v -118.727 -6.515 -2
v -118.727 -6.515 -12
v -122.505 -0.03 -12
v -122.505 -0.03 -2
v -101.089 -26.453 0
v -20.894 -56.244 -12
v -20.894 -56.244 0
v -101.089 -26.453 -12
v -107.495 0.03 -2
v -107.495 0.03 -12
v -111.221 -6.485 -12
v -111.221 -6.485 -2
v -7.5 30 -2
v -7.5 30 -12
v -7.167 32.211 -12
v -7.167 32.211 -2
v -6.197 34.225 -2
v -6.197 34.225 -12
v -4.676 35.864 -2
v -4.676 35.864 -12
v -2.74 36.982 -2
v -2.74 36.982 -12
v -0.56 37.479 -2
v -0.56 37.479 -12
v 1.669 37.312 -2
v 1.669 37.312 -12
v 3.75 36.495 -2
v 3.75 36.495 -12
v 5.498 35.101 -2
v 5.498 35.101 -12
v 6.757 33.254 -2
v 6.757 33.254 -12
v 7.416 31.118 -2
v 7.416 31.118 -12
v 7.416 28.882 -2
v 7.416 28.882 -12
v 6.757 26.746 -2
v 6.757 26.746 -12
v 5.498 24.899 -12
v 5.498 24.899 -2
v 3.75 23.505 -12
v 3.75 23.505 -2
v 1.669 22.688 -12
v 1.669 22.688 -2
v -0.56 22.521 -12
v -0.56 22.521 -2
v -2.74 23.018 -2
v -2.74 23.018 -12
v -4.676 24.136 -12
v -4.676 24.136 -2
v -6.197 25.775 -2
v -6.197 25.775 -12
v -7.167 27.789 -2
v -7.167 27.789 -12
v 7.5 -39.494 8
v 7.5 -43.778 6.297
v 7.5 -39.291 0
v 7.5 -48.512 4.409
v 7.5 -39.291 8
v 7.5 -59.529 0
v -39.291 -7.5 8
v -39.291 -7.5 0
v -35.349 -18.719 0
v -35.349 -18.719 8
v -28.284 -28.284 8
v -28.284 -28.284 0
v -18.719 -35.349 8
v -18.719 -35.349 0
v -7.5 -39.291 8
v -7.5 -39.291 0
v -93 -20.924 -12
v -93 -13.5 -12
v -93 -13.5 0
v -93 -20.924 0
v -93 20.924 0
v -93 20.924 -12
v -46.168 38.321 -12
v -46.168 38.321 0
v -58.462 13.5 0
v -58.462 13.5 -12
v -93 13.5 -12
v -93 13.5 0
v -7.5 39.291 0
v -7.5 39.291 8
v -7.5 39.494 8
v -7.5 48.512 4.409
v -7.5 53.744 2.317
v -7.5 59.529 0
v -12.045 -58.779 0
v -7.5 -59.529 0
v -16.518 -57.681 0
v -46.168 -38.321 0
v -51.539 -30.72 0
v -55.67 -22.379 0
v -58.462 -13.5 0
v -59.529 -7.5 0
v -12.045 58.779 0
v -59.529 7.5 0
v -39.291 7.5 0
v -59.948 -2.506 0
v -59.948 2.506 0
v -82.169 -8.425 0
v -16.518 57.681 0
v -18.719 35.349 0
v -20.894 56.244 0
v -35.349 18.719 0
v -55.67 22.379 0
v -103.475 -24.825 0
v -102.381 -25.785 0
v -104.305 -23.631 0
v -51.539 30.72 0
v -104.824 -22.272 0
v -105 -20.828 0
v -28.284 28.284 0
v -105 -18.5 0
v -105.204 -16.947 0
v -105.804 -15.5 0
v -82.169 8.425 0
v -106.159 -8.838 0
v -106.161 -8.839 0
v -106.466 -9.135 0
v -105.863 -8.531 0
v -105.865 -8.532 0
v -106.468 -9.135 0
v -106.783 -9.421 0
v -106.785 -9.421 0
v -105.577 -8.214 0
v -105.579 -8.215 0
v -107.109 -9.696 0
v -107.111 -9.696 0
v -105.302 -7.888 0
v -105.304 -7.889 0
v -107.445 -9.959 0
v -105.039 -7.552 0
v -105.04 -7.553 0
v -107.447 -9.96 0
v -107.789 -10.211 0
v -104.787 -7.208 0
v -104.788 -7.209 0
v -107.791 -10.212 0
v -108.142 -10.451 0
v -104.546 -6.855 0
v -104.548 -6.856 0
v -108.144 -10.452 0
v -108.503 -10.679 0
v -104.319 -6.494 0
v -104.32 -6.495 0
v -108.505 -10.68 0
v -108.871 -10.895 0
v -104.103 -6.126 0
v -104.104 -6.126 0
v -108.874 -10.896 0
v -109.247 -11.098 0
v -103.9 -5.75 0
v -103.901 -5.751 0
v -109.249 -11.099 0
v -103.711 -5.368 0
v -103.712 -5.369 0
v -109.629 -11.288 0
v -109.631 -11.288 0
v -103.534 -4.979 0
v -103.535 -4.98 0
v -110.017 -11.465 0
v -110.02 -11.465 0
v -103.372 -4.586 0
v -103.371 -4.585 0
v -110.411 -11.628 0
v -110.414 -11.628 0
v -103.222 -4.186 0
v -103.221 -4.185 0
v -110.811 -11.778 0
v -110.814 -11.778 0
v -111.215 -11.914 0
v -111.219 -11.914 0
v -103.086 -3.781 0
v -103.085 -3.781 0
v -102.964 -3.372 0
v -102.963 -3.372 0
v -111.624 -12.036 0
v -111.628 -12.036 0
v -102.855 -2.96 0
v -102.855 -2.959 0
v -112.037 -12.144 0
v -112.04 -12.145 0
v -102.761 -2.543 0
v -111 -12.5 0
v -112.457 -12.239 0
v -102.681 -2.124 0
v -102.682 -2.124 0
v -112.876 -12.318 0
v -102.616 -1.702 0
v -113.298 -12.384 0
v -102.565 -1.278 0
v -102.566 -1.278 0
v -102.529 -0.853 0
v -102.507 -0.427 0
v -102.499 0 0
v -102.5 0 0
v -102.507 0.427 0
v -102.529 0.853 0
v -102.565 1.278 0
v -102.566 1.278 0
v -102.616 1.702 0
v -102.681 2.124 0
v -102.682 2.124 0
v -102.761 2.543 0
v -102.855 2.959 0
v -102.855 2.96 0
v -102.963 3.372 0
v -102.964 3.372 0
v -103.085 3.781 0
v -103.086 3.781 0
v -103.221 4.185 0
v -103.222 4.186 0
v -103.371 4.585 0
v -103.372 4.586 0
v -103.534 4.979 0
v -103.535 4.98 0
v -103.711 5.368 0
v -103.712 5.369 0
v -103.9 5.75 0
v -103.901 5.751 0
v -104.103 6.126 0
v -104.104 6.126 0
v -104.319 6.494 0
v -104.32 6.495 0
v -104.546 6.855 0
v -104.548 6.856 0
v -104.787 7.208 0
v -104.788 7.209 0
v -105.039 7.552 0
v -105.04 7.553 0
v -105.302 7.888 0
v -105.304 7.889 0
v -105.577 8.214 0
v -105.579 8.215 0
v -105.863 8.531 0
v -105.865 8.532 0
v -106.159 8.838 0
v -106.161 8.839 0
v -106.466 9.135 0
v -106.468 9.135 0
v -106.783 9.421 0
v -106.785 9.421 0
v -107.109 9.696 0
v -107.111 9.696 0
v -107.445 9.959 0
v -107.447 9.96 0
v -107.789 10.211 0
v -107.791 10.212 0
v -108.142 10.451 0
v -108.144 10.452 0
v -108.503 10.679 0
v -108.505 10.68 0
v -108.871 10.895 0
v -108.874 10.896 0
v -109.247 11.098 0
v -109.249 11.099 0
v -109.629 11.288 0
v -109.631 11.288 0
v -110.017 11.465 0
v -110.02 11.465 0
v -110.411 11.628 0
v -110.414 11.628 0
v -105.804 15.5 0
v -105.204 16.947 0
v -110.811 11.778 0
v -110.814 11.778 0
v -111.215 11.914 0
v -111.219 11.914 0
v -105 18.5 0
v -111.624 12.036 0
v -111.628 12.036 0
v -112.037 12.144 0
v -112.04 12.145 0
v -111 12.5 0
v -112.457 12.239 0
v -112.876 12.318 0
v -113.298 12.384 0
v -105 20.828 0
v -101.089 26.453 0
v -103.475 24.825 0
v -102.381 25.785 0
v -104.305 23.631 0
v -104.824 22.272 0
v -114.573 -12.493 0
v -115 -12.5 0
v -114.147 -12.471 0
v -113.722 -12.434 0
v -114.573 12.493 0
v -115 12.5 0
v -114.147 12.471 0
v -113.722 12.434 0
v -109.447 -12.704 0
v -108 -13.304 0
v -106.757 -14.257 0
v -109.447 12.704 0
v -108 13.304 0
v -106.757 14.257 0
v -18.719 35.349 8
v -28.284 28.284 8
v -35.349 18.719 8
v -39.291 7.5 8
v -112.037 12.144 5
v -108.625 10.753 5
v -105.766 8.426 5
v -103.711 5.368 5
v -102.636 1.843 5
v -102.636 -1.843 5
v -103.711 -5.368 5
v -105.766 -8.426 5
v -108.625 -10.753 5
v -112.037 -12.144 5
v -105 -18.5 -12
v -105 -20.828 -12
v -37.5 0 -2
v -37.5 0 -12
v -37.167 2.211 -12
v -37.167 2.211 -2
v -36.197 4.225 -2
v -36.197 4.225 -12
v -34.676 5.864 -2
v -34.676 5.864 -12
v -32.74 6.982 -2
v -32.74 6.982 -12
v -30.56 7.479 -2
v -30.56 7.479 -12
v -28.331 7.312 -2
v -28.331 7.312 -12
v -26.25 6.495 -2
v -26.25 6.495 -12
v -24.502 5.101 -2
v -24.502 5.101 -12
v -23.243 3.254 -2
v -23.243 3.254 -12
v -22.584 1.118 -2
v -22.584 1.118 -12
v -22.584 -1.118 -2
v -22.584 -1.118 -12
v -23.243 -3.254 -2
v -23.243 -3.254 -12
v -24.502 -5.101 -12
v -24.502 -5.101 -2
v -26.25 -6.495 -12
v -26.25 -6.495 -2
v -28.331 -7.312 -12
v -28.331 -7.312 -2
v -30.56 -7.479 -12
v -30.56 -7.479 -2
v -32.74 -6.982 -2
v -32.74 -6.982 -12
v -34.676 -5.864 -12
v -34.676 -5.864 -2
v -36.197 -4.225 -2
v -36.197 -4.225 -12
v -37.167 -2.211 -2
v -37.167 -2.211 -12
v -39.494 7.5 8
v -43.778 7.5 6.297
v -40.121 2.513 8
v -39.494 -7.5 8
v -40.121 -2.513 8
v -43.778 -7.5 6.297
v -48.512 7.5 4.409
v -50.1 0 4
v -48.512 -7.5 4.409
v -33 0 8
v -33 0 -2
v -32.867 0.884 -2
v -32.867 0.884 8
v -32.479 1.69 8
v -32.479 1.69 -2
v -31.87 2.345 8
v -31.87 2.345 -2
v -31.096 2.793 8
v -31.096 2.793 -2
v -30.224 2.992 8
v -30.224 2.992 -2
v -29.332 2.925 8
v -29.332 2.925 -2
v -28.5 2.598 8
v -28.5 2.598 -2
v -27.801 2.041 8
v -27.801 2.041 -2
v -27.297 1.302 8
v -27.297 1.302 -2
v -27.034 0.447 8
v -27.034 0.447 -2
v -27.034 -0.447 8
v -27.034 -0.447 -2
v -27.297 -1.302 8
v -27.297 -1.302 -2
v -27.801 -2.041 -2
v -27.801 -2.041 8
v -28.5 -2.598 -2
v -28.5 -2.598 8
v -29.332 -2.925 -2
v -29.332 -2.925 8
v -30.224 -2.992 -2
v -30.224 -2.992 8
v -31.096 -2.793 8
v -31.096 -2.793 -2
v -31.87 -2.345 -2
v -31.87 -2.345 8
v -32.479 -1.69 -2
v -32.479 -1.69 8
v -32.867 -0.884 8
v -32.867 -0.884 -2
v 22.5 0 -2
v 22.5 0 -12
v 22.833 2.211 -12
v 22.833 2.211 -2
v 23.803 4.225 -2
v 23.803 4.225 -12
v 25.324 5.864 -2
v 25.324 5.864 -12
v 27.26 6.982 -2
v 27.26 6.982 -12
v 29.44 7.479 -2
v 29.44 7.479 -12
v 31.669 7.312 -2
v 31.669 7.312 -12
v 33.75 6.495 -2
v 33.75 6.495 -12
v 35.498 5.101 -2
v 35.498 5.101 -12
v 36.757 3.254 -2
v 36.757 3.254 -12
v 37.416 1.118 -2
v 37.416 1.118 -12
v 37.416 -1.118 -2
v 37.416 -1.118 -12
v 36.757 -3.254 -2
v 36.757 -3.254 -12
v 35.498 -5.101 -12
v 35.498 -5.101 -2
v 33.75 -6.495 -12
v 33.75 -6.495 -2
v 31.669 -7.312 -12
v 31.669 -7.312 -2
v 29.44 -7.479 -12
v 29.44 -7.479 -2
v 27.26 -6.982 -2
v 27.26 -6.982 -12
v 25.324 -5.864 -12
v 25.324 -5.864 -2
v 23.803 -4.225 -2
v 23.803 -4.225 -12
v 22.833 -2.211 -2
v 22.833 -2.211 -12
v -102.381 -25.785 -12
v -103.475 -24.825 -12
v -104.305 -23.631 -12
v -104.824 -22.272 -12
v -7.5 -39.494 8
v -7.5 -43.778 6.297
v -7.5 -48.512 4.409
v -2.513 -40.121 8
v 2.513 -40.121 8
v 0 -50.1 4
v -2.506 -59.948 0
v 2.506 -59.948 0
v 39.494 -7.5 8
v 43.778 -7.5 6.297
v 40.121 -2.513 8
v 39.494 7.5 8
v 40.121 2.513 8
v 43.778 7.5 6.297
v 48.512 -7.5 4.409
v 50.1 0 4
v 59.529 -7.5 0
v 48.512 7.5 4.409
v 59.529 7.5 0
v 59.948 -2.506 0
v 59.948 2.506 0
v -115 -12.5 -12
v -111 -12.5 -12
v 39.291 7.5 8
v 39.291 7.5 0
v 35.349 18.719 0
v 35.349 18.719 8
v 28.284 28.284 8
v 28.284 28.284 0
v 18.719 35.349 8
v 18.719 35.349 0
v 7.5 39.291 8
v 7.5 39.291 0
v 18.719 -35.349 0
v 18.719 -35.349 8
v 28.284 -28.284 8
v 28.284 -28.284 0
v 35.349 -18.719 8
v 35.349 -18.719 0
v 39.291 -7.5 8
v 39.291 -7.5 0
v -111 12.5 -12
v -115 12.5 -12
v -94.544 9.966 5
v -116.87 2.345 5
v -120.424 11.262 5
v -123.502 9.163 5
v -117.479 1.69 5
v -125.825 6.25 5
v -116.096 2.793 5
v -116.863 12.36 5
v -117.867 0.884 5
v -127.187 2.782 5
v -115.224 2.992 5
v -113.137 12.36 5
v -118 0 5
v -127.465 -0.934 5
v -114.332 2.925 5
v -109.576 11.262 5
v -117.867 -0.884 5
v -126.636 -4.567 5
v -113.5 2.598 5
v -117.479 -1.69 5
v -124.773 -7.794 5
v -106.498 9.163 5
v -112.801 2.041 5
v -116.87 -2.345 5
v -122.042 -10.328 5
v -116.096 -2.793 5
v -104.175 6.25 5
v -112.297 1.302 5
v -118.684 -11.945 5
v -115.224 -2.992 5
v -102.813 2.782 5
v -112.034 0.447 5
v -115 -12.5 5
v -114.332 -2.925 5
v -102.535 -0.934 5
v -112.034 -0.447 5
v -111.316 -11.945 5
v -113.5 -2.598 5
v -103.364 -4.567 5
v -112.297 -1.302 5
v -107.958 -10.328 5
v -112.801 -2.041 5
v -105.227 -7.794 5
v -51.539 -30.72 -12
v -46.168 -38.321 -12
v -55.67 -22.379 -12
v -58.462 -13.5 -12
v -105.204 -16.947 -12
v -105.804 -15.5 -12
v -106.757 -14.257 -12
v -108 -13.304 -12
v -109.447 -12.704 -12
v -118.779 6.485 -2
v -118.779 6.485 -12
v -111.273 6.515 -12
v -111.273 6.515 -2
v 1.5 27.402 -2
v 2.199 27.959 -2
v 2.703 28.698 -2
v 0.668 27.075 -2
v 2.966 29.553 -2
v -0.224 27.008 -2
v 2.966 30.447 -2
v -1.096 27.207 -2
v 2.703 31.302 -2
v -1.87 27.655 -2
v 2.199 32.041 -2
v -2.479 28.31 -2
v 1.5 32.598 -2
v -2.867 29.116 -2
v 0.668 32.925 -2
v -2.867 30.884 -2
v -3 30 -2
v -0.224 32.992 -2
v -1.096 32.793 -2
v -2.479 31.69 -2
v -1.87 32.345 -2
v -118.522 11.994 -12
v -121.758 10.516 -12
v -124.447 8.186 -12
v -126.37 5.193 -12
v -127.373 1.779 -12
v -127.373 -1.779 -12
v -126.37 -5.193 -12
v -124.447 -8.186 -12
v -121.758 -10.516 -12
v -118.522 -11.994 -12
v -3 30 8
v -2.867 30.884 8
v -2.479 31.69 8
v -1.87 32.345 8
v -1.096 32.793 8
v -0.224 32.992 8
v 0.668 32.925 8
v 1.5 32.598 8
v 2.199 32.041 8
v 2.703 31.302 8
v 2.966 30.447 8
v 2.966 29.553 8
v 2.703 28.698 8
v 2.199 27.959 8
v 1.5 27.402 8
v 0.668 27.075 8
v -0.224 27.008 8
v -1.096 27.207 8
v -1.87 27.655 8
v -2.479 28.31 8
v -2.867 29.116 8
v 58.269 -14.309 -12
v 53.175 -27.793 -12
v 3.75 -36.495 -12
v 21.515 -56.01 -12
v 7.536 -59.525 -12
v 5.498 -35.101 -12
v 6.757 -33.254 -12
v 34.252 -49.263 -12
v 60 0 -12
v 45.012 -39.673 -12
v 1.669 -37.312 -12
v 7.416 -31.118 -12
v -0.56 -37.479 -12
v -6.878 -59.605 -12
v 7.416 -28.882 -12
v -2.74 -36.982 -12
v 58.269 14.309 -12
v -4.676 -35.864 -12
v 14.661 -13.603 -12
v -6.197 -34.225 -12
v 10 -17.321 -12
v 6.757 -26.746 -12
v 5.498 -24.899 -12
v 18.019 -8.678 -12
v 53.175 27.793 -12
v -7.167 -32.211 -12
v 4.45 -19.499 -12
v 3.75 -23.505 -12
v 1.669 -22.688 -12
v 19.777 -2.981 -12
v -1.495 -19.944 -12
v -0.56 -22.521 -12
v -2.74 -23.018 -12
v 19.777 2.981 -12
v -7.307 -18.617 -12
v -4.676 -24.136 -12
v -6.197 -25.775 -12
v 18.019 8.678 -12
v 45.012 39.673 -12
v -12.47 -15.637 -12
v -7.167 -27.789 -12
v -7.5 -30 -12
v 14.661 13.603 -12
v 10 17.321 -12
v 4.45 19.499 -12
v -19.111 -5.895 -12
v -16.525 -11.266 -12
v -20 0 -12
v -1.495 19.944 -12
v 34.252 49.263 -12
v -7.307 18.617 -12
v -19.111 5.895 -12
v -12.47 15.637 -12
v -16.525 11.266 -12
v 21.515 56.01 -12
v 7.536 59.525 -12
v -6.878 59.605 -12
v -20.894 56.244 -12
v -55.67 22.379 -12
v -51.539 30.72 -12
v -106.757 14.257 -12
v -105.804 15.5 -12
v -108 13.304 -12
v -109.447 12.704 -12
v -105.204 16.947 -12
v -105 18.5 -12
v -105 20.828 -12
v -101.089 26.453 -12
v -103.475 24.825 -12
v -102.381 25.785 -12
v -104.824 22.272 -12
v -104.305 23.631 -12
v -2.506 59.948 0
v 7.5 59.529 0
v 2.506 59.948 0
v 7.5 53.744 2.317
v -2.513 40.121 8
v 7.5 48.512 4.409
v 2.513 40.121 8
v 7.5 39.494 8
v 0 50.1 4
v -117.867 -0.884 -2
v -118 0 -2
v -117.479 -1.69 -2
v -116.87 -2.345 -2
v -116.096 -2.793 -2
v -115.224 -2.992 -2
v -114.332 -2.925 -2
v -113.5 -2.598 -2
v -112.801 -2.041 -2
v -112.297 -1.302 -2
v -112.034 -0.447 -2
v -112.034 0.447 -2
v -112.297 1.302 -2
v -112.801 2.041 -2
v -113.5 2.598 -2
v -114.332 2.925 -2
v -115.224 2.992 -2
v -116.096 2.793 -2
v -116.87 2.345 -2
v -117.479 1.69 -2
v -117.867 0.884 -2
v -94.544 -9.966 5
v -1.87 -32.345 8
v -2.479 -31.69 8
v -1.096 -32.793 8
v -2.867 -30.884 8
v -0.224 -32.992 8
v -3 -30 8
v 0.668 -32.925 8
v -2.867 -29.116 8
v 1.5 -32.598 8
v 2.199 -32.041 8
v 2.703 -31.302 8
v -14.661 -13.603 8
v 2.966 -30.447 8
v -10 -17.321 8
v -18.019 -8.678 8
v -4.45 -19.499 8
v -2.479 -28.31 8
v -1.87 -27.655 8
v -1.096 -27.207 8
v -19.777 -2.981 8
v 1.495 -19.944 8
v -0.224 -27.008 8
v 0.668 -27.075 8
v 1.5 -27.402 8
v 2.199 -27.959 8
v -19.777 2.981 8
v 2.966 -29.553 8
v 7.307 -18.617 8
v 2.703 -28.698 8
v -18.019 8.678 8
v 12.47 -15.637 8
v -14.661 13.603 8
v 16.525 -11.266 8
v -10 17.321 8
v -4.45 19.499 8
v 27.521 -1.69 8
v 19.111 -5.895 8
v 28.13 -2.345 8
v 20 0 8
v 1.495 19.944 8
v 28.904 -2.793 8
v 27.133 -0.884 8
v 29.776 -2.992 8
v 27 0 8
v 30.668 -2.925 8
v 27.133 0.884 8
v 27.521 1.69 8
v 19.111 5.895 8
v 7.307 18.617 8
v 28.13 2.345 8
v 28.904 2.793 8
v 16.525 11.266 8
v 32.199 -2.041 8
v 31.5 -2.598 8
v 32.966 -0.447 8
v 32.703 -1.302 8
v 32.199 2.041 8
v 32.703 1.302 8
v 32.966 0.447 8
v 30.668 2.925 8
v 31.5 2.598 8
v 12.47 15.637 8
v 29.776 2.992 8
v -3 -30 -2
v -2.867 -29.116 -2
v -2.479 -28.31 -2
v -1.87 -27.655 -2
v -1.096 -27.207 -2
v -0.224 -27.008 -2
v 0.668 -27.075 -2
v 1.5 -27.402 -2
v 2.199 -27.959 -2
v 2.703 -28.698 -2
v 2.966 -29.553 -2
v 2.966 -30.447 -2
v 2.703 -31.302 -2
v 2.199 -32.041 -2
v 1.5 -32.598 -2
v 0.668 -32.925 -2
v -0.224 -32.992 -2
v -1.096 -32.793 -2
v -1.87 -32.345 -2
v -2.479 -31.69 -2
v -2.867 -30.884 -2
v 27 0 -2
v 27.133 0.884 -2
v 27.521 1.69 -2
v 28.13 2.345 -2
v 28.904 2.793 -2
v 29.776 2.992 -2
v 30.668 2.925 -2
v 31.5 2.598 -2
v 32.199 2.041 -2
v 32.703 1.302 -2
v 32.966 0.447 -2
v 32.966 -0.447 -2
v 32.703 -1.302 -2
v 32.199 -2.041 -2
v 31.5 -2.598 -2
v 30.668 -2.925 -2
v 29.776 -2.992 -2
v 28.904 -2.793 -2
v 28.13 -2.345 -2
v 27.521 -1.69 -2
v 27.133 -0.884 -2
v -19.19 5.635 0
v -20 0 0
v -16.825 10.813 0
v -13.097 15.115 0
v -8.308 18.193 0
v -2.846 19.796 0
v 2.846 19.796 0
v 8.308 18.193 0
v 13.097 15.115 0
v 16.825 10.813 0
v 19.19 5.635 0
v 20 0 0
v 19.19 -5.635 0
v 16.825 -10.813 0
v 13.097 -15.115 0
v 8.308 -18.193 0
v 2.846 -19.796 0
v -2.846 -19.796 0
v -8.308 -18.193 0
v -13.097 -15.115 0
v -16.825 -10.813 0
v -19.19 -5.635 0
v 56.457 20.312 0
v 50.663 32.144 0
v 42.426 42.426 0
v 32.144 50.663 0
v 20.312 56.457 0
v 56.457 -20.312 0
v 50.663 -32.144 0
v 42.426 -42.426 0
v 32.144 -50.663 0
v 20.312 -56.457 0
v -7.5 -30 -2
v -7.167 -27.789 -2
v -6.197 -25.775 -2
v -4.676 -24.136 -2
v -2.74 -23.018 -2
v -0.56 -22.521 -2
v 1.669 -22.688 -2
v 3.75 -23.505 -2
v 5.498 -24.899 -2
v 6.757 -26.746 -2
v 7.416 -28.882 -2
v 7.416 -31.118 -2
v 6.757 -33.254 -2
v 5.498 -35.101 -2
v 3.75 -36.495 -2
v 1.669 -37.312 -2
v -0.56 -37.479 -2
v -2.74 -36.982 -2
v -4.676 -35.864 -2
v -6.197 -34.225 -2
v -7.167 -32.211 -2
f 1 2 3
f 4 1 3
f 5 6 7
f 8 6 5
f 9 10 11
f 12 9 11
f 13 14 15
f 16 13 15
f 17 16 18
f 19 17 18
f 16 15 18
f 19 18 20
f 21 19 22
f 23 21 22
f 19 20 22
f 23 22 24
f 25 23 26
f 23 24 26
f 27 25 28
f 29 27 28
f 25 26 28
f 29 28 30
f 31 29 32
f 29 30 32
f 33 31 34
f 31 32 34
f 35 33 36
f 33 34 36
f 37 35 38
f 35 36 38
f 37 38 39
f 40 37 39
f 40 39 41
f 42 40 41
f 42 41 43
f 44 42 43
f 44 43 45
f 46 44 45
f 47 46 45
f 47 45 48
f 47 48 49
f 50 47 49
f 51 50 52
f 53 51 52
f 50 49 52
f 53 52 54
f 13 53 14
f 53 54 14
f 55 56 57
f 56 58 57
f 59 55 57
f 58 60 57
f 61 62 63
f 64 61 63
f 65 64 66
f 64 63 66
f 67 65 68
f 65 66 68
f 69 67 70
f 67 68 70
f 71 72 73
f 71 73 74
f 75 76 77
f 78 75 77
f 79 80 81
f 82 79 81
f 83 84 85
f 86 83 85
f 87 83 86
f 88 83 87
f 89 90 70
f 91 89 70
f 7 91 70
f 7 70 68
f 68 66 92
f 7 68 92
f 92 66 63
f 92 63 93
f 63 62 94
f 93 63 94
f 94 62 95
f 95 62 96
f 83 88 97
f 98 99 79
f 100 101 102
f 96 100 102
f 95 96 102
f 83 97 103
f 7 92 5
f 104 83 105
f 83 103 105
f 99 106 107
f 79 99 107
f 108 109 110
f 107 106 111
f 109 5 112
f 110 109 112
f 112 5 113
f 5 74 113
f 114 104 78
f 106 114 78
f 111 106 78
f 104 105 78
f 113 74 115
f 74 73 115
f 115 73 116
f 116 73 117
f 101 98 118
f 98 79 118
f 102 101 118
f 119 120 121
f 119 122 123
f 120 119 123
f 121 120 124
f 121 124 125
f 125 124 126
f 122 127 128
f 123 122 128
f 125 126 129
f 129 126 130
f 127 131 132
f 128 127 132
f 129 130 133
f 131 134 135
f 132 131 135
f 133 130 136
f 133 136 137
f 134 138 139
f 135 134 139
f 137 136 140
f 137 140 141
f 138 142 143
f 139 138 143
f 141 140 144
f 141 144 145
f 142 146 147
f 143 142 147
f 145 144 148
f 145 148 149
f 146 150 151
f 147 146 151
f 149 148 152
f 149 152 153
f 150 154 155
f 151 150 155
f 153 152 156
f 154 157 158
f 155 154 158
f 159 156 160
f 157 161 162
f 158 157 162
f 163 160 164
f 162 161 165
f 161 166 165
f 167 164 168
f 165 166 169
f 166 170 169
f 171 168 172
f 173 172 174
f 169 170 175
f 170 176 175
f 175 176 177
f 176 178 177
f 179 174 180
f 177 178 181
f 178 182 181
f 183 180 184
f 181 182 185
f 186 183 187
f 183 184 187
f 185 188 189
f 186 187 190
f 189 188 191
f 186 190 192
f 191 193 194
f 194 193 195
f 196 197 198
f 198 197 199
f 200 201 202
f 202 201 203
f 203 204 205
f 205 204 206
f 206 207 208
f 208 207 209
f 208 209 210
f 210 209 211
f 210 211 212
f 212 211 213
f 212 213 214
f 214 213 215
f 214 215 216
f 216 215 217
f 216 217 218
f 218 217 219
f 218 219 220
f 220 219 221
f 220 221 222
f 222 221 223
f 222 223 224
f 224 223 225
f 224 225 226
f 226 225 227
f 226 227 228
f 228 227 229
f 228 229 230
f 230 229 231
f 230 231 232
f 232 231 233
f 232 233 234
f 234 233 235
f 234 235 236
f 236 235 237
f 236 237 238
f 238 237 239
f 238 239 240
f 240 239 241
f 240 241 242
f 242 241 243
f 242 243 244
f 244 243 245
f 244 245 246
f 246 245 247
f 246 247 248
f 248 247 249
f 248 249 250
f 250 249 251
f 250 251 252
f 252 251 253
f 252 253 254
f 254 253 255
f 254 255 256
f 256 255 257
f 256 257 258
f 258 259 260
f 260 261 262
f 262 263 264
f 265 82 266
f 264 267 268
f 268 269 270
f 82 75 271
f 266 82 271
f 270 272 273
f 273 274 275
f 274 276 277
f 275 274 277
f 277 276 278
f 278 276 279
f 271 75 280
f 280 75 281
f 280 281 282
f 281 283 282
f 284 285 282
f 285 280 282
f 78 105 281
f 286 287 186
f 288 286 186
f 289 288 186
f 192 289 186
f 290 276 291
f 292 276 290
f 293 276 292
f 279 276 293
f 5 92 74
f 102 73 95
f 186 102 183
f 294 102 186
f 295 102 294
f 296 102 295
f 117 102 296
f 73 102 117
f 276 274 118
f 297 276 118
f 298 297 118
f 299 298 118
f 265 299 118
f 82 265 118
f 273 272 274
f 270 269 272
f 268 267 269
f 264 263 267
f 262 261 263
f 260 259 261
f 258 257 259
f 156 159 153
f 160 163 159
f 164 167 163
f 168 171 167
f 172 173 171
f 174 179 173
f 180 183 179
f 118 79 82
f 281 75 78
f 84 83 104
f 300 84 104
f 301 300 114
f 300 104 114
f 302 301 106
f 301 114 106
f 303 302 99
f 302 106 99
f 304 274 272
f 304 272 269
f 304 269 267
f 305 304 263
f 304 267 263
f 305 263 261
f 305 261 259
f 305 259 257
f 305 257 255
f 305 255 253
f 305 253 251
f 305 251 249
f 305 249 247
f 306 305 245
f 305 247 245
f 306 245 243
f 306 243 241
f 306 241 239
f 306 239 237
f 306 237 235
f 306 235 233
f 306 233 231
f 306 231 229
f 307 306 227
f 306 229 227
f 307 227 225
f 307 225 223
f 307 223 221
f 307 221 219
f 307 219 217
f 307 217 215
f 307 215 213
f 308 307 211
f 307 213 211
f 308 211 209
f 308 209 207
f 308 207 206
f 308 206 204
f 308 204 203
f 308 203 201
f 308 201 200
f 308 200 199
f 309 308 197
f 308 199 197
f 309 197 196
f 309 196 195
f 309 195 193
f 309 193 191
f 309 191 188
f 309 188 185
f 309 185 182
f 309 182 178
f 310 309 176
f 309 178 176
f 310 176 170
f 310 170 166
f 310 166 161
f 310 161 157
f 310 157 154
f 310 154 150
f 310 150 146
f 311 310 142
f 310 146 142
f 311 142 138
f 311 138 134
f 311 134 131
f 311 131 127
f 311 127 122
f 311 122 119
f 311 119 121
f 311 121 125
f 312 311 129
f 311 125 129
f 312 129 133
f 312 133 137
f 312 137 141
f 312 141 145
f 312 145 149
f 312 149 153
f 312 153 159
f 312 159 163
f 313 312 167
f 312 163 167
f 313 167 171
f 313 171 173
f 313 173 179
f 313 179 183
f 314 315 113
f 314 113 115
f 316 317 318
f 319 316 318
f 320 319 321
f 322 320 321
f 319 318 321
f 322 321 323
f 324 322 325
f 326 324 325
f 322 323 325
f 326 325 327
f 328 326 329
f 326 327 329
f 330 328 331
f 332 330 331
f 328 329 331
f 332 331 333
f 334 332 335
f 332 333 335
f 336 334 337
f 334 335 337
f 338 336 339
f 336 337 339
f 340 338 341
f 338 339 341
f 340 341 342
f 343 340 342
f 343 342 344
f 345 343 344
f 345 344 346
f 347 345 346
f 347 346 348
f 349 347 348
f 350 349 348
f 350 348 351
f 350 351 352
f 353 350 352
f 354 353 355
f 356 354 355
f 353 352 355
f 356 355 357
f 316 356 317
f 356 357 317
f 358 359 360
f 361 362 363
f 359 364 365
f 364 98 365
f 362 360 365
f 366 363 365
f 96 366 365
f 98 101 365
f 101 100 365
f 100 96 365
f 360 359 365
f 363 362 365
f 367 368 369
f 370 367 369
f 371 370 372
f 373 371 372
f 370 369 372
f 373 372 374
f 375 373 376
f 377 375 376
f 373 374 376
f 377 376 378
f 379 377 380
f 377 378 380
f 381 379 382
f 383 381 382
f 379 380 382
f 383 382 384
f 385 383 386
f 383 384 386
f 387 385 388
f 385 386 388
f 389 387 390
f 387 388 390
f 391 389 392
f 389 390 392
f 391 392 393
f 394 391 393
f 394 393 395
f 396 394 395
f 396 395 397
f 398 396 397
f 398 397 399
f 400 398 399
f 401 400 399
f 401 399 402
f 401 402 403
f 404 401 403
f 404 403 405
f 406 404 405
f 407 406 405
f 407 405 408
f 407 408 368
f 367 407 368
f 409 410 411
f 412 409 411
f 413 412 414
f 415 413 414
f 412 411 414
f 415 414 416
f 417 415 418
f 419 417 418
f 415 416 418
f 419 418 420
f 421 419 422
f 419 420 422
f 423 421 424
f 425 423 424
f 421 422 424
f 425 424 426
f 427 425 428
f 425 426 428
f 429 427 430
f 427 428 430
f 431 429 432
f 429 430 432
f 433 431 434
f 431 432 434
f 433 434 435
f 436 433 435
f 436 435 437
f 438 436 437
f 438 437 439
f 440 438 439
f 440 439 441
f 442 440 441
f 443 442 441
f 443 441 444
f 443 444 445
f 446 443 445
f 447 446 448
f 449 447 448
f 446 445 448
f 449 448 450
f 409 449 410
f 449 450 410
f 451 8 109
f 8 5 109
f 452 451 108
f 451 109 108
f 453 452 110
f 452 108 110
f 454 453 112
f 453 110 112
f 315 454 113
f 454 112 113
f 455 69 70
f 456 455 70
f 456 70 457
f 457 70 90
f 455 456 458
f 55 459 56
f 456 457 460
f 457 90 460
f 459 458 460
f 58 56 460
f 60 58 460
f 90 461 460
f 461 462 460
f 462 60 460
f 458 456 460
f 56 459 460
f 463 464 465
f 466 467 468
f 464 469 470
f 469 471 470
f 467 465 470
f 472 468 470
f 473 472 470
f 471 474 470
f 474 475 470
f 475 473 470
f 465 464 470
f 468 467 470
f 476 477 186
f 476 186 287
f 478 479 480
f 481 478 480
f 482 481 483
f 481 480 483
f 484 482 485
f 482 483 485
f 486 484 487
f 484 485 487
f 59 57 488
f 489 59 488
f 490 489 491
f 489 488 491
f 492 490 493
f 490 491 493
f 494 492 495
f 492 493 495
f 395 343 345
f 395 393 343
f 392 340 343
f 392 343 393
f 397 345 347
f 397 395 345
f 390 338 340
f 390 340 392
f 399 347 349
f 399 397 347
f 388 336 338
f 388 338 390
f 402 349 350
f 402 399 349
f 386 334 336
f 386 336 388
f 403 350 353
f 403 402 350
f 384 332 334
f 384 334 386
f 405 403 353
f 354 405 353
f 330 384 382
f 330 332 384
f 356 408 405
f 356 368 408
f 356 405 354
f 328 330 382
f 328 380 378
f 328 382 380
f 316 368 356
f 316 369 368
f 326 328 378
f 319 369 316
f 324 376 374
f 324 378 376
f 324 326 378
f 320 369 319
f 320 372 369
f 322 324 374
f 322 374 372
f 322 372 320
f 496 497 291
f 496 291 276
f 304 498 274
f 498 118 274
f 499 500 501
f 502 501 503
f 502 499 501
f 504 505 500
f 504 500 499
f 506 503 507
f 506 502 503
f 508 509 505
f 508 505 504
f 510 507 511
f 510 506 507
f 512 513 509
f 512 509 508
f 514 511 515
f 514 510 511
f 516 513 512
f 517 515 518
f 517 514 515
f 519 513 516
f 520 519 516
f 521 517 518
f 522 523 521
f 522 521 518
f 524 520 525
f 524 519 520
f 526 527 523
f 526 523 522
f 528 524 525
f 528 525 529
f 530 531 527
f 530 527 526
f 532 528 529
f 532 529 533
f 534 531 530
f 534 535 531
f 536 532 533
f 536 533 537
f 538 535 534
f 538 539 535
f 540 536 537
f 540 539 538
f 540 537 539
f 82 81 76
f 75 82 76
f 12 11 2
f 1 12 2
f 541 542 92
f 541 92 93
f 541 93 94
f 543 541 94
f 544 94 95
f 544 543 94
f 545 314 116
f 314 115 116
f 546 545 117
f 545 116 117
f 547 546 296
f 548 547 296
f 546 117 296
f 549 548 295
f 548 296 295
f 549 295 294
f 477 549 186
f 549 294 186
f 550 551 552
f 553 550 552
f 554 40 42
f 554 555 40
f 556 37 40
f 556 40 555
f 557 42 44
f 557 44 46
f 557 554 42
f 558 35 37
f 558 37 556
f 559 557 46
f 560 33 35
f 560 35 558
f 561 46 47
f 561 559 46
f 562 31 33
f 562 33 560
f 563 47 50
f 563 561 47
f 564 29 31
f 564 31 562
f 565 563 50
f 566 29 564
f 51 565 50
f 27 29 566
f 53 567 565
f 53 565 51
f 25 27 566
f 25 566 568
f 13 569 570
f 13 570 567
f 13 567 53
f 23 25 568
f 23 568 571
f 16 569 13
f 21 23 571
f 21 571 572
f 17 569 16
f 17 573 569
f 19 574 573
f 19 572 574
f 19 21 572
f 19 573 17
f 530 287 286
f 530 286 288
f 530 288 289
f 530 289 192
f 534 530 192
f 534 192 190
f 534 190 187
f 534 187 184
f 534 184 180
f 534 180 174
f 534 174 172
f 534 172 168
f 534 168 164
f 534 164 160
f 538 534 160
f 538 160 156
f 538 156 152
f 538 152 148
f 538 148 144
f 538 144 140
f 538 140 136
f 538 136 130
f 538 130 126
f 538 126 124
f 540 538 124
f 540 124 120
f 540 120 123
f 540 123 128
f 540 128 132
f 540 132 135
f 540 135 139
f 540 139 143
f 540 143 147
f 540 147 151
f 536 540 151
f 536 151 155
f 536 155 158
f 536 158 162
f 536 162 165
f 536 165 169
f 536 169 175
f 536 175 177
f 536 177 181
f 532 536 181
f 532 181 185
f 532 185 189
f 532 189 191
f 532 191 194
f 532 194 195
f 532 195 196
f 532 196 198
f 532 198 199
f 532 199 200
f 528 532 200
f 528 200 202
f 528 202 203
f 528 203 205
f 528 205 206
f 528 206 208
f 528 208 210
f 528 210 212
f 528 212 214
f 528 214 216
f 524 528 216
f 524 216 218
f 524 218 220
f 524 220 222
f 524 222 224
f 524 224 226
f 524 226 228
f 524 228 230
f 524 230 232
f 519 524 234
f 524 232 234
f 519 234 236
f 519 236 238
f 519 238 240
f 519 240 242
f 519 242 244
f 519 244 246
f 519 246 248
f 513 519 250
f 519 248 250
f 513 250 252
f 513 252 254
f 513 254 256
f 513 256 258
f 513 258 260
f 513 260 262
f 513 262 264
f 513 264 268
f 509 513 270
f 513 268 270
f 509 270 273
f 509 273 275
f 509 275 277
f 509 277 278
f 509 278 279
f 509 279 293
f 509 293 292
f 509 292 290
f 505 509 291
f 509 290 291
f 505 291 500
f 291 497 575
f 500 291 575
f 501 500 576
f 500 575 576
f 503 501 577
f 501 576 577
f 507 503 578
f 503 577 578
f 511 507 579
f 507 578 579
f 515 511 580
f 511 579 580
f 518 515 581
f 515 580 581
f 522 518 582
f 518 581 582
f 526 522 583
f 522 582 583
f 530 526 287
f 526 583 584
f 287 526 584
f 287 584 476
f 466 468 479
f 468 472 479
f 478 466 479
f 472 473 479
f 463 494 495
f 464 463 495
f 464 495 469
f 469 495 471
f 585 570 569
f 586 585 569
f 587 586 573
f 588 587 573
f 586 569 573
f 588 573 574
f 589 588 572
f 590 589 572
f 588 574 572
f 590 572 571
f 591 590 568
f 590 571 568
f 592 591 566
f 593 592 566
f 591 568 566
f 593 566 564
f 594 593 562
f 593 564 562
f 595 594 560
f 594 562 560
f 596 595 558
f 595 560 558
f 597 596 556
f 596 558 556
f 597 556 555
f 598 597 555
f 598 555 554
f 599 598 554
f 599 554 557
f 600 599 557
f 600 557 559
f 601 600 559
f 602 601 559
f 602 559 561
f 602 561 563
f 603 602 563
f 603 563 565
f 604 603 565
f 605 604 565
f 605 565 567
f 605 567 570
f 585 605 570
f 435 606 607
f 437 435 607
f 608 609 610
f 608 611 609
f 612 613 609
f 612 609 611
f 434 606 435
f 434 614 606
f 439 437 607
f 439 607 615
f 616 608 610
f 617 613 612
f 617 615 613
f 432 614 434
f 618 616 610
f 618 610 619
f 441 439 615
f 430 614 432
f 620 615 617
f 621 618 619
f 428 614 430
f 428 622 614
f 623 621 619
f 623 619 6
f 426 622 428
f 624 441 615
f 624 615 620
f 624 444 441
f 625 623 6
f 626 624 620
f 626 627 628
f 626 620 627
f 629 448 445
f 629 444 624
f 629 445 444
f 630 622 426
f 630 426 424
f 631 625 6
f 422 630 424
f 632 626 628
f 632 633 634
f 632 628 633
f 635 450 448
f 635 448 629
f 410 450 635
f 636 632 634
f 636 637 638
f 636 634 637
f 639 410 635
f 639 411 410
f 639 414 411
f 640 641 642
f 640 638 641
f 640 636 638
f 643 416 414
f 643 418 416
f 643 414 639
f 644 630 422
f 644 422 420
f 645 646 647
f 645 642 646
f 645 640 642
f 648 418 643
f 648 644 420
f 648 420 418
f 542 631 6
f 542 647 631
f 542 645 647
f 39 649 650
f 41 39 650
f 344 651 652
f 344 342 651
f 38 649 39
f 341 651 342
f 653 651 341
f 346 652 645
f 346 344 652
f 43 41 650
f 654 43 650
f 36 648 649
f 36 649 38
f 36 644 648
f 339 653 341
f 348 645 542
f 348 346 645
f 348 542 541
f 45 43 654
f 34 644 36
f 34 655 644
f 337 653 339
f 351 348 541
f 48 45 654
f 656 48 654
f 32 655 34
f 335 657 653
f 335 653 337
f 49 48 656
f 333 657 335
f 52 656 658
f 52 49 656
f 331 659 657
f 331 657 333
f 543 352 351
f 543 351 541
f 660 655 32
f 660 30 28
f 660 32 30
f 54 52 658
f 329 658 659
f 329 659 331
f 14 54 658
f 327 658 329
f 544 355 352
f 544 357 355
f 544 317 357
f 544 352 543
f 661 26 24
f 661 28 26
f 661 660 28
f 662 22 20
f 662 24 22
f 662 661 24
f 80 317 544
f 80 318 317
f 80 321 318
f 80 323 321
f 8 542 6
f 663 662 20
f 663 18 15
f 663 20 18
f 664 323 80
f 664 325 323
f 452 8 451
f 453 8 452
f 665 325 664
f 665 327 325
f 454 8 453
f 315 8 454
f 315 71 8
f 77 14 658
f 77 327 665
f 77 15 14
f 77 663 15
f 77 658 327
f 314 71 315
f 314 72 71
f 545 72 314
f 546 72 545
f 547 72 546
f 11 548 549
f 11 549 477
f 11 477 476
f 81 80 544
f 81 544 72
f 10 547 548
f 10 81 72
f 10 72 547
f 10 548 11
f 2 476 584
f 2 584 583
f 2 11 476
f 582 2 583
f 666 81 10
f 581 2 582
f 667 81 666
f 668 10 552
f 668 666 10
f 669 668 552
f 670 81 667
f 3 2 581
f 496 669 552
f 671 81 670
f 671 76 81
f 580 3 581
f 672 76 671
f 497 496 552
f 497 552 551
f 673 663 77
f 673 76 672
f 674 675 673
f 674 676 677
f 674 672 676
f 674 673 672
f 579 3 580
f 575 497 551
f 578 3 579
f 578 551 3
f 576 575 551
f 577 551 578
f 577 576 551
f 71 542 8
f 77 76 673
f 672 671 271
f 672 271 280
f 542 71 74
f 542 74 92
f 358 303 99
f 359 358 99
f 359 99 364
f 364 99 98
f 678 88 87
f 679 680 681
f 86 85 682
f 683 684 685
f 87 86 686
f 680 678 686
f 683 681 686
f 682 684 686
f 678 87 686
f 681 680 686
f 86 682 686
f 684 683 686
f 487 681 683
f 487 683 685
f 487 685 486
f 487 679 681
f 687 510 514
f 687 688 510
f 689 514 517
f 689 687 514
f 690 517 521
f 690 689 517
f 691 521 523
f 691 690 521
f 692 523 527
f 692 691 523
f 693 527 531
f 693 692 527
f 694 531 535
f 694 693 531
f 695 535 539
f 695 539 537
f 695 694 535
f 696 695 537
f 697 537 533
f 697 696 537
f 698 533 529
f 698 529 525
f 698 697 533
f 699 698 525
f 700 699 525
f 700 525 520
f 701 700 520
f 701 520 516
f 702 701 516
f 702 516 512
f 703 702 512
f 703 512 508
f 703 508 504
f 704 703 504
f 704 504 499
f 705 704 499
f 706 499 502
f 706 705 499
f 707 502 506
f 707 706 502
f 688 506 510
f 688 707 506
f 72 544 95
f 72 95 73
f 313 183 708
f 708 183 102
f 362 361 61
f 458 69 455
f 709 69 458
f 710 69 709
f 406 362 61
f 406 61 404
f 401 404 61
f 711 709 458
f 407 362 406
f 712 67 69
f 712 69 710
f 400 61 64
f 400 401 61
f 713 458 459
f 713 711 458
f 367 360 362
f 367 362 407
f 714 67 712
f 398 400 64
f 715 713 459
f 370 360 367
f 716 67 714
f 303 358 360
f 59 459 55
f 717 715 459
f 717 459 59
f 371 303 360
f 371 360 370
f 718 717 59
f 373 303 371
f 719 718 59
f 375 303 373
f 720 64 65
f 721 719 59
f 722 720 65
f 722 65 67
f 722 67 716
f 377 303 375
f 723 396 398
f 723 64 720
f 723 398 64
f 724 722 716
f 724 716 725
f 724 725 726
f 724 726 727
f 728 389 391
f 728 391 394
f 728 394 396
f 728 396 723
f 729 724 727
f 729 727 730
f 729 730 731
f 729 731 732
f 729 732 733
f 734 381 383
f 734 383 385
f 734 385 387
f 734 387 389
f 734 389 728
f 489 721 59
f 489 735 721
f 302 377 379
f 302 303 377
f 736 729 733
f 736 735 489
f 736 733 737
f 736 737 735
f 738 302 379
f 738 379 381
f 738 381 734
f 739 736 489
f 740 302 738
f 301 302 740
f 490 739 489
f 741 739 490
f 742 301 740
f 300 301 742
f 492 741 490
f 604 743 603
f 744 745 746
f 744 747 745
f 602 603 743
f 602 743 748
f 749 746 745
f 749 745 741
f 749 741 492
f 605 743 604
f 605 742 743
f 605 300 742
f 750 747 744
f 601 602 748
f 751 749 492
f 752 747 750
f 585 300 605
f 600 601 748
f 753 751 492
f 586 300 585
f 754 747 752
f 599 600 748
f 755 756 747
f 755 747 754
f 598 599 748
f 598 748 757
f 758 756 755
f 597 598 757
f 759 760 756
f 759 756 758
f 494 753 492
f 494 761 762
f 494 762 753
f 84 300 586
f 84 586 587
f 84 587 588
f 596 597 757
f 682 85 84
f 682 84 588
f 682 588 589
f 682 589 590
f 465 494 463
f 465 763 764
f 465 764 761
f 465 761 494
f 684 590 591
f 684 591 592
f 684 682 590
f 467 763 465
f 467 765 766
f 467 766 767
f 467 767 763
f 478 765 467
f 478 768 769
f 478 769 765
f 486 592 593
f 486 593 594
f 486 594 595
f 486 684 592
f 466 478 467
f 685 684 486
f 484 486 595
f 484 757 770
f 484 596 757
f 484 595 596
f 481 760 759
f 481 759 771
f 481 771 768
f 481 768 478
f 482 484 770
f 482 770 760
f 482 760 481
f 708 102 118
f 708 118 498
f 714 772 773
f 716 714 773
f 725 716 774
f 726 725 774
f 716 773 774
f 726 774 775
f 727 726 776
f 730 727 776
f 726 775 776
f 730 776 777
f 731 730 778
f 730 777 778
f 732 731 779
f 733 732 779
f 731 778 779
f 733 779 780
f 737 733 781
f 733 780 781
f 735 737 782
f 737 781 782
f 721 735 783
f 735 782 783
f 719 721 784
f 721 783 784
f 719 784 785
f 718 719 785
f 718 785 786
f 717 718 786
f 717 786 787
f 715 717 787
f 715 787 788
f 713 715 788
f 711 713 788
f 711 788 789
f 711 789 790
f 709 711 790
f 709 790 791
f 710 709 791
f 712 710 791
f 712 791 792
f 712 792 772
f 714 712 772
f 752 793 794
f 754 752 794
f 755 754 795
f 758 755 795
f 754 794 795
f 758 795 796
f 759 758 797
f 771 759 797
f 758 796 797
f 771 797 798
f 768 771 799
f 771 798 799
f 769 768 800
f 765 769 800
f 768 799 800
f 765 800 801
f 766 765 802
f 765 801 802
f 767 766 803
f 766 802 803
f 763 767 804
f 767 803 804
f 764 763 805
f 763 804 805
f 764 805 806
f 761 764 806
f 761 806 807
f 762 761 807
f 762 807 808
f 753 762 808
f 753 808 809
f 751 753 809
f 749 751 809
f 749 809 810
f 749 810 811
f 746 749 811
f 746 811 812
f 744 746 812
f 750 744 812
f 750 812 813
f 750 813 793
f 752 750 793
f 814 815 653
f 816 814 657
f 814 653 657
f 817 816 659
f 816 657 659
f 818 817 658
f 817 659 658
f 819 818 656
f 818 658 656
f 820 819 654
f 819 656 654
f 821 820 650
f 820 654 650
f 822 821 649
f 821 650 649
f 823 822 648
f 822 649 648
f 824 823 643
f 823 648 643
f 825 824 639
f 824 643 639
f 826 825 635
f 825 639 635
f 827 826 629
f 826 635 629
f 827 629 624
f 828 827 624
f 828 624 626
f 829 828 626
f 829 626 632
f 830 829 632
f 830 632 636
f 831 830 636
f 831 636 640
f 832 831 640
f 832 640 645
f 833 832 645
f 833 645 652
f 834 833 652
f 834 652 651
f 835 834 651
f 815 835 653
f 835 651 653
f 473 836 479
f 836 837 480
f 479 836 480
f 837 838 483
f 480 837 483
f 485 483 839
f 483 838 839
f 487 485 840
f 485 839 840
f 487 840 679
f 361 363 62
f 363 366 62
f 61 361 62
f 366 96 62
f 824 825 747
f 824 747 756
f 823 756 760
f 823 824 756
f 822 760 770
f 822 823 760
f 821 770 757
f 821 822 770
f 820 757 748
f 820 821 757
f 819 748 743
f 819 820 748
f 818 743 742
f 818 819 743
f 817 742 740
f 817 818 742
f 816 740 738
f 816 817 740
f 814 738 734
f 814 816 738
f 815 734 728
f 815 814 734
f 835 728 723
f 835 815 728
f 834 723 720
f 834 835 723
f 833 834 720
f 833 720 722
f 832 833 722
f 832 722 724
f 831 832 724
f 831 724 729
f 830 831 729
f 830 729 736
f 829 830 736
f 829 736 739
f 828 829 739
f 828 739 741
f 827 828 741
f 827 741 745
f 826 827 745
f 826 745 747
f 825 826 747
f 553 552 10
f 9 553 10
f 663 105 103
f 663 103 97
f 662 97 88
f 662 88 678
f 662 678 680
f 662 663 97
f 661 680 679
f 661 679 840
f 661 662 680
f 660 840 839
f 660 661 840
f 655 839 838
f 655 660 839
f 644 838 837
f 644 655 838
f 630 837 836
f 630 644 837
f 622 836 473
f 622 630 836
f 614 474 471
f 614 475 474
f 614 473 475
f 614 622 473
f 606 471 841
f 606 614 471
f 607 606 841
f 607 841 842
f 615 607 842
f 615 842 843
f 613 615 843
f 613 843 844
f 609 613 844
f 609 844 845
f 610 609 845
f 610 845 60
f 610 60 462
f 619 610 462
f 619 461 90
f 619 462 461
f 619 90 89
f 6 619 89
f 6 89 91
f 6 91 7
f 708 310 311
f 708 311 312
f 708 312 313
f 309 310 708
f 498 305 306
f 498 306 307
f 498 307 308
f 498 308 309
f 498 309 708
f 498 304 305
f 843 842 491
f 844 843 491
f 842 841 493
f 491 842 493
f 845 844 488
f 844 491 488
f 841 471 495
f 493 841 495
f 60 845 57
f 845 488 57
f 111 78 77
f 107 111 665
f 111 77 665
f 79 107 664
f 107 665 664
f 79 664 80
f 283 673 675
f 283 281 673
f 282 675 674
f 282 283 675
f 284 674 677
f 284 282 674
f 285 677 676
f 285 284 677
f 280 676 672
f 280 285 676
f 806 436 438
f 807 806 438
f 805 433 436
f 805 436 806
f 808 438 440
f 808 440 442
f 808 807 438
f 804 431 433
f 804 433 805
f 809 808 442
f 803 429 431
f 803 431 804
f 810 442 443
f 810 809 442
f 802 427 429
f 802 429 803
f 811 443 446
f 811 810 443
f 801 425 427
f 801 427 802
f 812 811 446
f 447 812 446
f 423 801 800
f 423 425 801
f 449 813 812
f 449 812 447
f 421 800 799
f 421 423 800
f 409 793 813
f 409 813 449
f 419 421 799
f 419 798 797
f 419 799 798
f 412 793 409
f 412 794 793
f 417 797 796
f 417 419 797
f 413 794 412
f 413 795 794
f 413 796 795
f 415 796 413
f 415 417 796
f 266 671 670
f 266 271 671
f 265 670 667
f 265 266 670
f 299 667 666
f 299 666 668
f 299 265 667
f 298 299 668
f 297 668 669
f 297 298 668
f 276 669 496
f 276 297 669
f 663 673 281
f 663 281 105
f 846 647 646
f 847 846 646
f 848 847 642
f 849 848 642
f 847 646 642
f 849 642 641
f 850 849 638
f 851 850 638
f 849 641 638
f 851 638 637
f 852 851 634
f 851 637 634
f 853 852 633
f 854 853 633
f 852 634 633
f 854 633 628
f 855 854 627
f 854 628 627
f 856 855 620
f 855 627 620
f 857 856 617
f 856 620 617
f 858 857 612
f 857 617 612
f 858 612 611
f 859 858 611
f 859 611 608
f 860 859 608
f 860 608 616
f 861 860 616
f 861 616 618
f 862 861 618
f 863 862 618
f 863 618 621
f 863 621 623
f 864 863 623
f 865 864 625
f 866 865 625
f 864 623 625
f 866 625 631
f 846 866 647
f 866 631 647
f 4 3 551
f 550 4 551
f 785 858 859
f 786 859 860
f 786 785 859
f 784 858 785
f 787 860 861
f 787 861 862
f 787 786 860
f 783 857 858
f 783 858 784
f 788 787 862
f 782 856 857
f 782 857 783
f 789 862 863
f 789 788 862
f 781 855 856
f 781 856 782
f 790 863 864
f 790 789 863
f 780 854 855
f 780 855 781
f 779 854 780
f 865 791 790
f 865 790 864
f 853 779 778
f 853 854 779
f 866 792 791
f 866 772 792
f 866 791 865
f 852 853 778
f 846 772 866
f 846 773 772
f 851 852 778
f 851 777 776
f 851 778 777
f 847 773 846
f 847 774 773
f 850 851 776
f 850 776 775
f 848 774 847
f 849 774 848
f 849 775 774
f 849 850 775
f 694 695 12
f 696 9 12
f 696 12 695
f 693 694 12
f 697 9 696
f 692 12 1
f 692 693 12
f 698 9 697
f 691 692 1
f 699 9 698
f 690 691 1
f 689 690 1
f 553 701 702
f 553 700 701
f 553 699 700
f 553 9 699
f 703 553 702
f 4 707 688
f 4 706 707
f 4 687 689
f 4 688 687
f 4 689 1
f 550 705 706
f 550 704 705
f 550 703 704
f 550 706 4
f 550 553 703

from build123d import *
from OCP.BRepFilletAPI import BRepFilletAPI_MakeChamfer
from build123d.topology import SkipClean

# Parameters (mm, degrees)
SKETCH2_R           = 40
SKETCH2_R_2         = 20
BOSS_EXTRUDE1_DEPTH = 8
BOSS_EXTRUDE2_START = 12
SKETCH3_R           = 20
BOSS_EXTRUDE2_DEPTH = 12
SKETCH4_R           = 7.5
CUT_EXTRUDE1_DEPTH  = 10
SKETCH5_R           = 3
CUT_EXTRUDE2_DEPTH  = 29
BOSS_EXTRUDE3_DEPTH = 8
CHAMFER3_SIZE       = 8
CHAMFER3_SIZE_2     = 19.800694827
BOSS_EXTRUDE4_DEPTH = 12
FILLET1_R           = 6
CUT_EXTRUDE3_DEPTH  = 10
SKETCH9_R           = 3
CUT_EXTRUDE4_DEPTH  = 6
CUT_EXTRUDE5_START  = -22
CUT_EXTRUDE5_DEPTH  = 22
SKETCH12_R          = 12.5
SKETCH12_R_2        = 3
BOSS_EXTRUDE5_DEPTH = 5
BOSS_EXTRUDE6_DEPTH = 5
CHAMFER7_SIZE       = 8
CHAMFER7_SIZE_2     = 19.800694827


# Some blends are built 0.0001 mm under size
with BuildPart() as part:
    # Sketch2 → Boss-Extrude1 (new body)
    with BuildSketch(Plane.XY):
        Circle(SKETCH2_R)
        Circle(SKETCH2_R_2, mode=Mode.SUBTRACT)
    extrude(amount=BOSS_EXTRUDE1_DEPTH)

    # Sketch3 → Boss-Extrude2 (add)
    with SkipClean():  # the faces are left unmerged after this step: merging them gives an invalid solid
        with BuildSketch(Plane(origin=(0, 0, 0), x_dir=(-1, 0, 0), z_dir=(0, 0, -1)).offset(BOSS_EXTRUDE2_START)):
            with BuildLine():
                Line((105, -25), (105, 25))
                Line((105, 25), (20.894189842, 56.244402662))
                ThreePointArc((20.894189842, 56.244402662), (-60, 0), (20.894189842, -56.244402662))
                Line((20.894189842, -56.244402662), (105, -25))
            make_face()
            Circle(SKETCH3_R, mode=Mode.SUBTRACT)
        extrude(amount=-BOSS_EXTRUDE2_DEPTH)

    # Sketch4 → Cut-Extrude1 (cut)
    with SkipClean():  # the faces are left unmerged after this step: merging them gives an invalid solid
        with BuildSketch(Plane(origin=(0, 0, -12), x_dir=(-1, 0, 0), z_dir=(0, 0, -1))):
            with Locations((0, 30)):
                Circle(SKETCH4_R)
            with Locations((30, 0)):
                Circle(SKETCH4_R)
            with Locations((0, -30)):
                Circle(SKETCH4_R)
            with Locations((-30, 0)):
                Circle(SKETCH4_R)
        extrude(amount=-CUT_EXTRUDE1_DEPTH, mode=Mode.SUBTRACT)

    # Sketch5 → Cut-Extrude2 (cut)
    with SkipClean():  # the faces are left unmerged after this step: merging them gives an invalid solid
        with BuildSketch(Plane(origin=(0, 0, -2), x_dir=(-1, 0, 0), z_dir=(0, 0, -1))):
            with Locations((30, 0)):
                Circle(SKETCH5_R)
            with Locations((0, -30)):
                Circle(SKETCH5_R)
            with Locations((-30, 0)):
                Circle(SKETCH5_R)
            with Locations((0, 30)):
                Circle(SKETCH5_R)
        extrude(amount=-CUT_EXTRUDE2_DEPTH, mode=Mode.SUBTRACT)

    # Sketch6 → Boss-Extrude3 (add)
    with SkipClean():  # the faces are left unmerged after this step: merging them gives an invalid solid
        with BuildSketch(Plane.XY):
            with BuildLine():
                Line((39.290584114, -7.5), (59.529404499, -7.5))
                ThreePointArc((59.529404499, -7.5), (60, 0), (59.529404499, 7.5))
                Line((59.529404499, 7.5), (39.290584114, 7.5))
                ThreePointArc((39.290584114, 7.5), (40, 0), (39.290584114, -7.5))
            make_face()
            with BuildLine():
                Line((-7.5, 39.290584114), (-7.5, 59.529404499))
                ThreePointArc((-7.5, 59.529404499), (0, 60), (7.5, 59.529404499))
                Line((7.5, 59.529404499), (7.5, 39.290584114))
                ThreePointArc((7.5, 39.290584114), (0, 40), (-7.5, 39.290584114))
            make_face()
            with BuildLine():
                Line((-7.5, -39.290584114), (-7.5, -59.529404499))
                ThreePointArc((-7.5, -59.529404499), (0, -60), (7.5, -59.529404499))
                Line((7.5, -59.529404499), (7.5, -39.290584114))
                ThreePointArc((7.5, -39.290584114), (0, -40), (-7.5, -39.290584114))
            make_face()
            with BuildLine():
                Line((-39.290584114, 7.5), (-59.529404499, 7.5))
                ThreePointArc((-59.529404499, 7.5), (-60, 0), (-59.529404499, -7.5))
                Line((-59.529404499, -7.5), (-39.290584114, -7.5))
                ThreePointArc((-39.290584114, -7.5), (-40, 0), (-39.290584114, 7.5))
            make_face()
        extrude(amount=BOSS_EXTRUDE3_DEPTH)

    # Chamfer3
    chamfer3_edges_1 = [part.edges().sort_by_distance(p)[0] for p in [
        (0, 60, 8),
    ]]
    chamfer3_side_1 = [part.faces().sort_by_distance(p)[0] for p in [
        (0, 60, 7.84),
    ]]
    chamfer3_edges_2 = [part.edges().sort_by_distance(p)[0] for p in [
        (60, 0, 8),
    ]]
    chamfer3_side_2 = [part.faces().sort_by_distance(p)[0] for p in [
        (59.84, 0, 8),
    ]]
    chamfer3_edges_3 = [part.edges().sort_by_distance(p)[0] for p in [
        (-60, 0, 8),
    ]]
    chamfer3_side_3 = [part.faces().sort_by_distance(p)[0] for p in [
        (-59.84, 0, 8),
    ]]
    chamfer3_edges_4 = [part.edges().sort_by_distance(p)[0] for p in [
        (0, -60, 8),
    ]]
    chamfer3_side_4 = [part.faces().sort_by_distance(p)[0] for p in [
        (0, -59.84, 8),
    ]]
    chamfer3 = BRepFilletAPI_MakeChamfer(part.part.solid().wrapped)
    for e in chamfer3_edges_1:
        chamfer3.Add(CHAMFER3_SIZE - 0.0001, CHAMFER3_SIZE_2 - 0.0001, e.wrapped, chamfer3_side_1[0].wrapped)
    for e in chamfer3_edges_2:
        chamfer3.Add(CHAMFER3_SIZE_2 - 0.0001, CHAMFER3_SIZE - 0.0001, e.wrapped, chamfer3_side_2[0].wrapped)
    for e in chamfer3_edges_3:
        chamfer3.Add(CHAMFER3_SIZE_2 - 0.0001, CHAMFER3_SIZE - 0.0001, e.wrapped, chamfer3_side_3[0].wrapped)
    for e in chamfer3_edges_4:
        chamfer3.Add(CHAMFER3_SIZE_2 - 0.0001, CHAMFER3_SIZE - 0.0001, e.wrapped, chamfer3_side_4[0].wrapped)
    add(Compound.cast(chamfer3.Shape()), mode=Mode.REPLACE)  # a hair under: the kernel refuses the full size

    # Sketch7 → Boss-Extrude4 (add)
    with SkipClean():  # the faces are left unmerged after this step: merging them gives an invalid solid
        with BuildSketch(Plane(origin=(0, 0, -12), x_dir=(-1, 0, 0), z_dir=(0, 0, -1))):
            with BuildLine():
                Line((115, 12.5), (105, 12.5))
                Line((105, 12.5), (105, -12.5))
                Line((105, -12.5), (115, -12.5))
                ThreePointArc((115, -12.5), (127.5, 0), (115, 12.5))
            make_face()
        extrude(amount=-BOSS_EXTRUDE4_DEPTH)

    # Fillet1
    fillet1_edges = [part.edges().sort_by_distance(p)[0] for p in [
        (-105, -25, -6),
        (-105, 25, -6),
        (-105, -12.5, -6),
        (-105, 12.5, -6),
    ]]
    fillet(fillet1_edges, radius=FILLET1_R)

    # Sketch8 → Cut-Extrude3 (cut)
    with SkipClean():  # the faces are left unmerged after this step: merging them gives an invalid solid
        with BuildSketch(Plane(origin=(0, 0, -12), x_dir=(-1, 0, 0), z_dir=(0, 0, -1))):
            Polygon((118.778590974, 6.485027647), (111.2730968, 6.514869597), (107.494505826, 0.02984195), (111.221409026, -6.485027647), (118.7269032, -6.514869597), (122.505494174, -0.02984195), align=None)
        extrude(amount=-CUT_EXTRUDE3_DEPTH, mode=Mode.SUBTRACT)

    # Sketch9 → Cut-Extrude4 (cut)
    with SkipClean():  # the faces are left unmerged after this step: merging them gives an invalid solid
        with BuildSketch(Plane(origin=(0, 0, -2), x_dir=(-1, 0, 0), z_dir=(0, 0, -1))):
            with Locations((115, 0)):
                Circle(SKETCH9_R)
        extrude(amount=-CUT_EXTRUDE4_DEPTH, mode=Mode.SUBTRACT)

    # Sketch10 → Cut-Extrude5 (cut)
    with SkipClean():  # the faces are left unmerged after this step: merging them gives an invalid solid
        with BuildSketch(Plane.XY.offset(CUT_EXTRUDE5_START)):
            with BuildLine():
                Line((-58.46152581, -13.5), (-93, -13.5))
                Line((-93, -13.5), (-93, -20.923688206))
                Line((-93, -20.923688206), (-46.167935821, -38.321295672))
                ThreePointArc((-46.167935821, -38.321295672), (-53.766674065, -26.62977206), (-58.46152581, -13.5))
            make_face()
            with BuildLine():
                Line((-93, 20.923688206), (-46.167935821, 38.321295672))
                ThreePointArc((-46.167935821, 38.321295672), (-53.766674065, 26.62977206), (-58.46152581, 13.5))
                Line((-58.46152581, 13.5), (-93, 13.5))
                Line((-93, 13.5), (-93, 20.923688206))
            make_face()
        extrude(amount=CUT_EXTRUDE5_DEPTH, mode=Mode.SUBTRACT)

    # Sketch12 → Boss-Extrude5 (add)
    with SkipClean():  # the faces are left unmerged after this step: merging them gives an invalid solid
        with BuildSketch(Plane.XY):
            with Locations(Location((-115, 0, 0), (0, 0, 270))):
                Circle(SKETCH12_R)
            with Locations(Location((-115, 0, 0), (0, 0, 180))):
                Circle(SKETCH12_R_2, mode=Mode.SUBTRACT)
        extrude(amount=BOSS_EXTRUDE5_DEPTH)

    # Sketch13 → Boss-Extrude6 (add)
    with SkipClean():  # the faces are left unmerged after this step: merging them gives an invalid solid
        with BuildSketch(Plane.XY):
            with BuildLine():
                Line((-74.743265697, 7.5), (-112.037181998, 12.144415139))
                ThreePointArc((-112.037181998, 12.144415139), (-102.499395631, 0), (-112.037181998, -12.144415139))
                Line((-112.037181998, -12.144415139), (-74.743265697, -7.5))
                Line((-74.743265697, -7.5), (-74.743265697, 7.5))
            make_face()
        extrude(amount=BOSS_EXTRUDE6_DEPTH)

    # Chamfer7
    # the kernel refuses this chamfer: 19.800694827, 8 mm, written as the material it takes off along each edge
    with BuildSketch(Plane(origin=(-74.743265697, -58.842983777, 5), x_dir=(0.08816706473193492, 0, -0.9961057015681392), z_dir=(0, 1, 0))) as chamfer7_piece_1_section:
        Polygon((CHAMFER7_SIZE * 0.996105701568, CHAMFER7_SIZE * 0.0881670647319), (-CHAMFER7_SIZE_2 * 0.0881670647334, CHAMFER7_SIZE_2 * 0.996105701585), (0, 0), align=None)
    chamfer7_piece_1 = extrude(amount=117.685967554, mode=Mode.PRIVATE)
    chamfer7_piece_1 = split(chamfer7_piece_1, bisect_by=Plane(origin=(-82.305145915, 0, 0), z_dir=(0, 0, 1)), keep=Keep.TOP, mode=Mode.PRIVATE)
    add(chamfer7_piece_1, mode=Mode.SUBTRACT)


solid = part.part
